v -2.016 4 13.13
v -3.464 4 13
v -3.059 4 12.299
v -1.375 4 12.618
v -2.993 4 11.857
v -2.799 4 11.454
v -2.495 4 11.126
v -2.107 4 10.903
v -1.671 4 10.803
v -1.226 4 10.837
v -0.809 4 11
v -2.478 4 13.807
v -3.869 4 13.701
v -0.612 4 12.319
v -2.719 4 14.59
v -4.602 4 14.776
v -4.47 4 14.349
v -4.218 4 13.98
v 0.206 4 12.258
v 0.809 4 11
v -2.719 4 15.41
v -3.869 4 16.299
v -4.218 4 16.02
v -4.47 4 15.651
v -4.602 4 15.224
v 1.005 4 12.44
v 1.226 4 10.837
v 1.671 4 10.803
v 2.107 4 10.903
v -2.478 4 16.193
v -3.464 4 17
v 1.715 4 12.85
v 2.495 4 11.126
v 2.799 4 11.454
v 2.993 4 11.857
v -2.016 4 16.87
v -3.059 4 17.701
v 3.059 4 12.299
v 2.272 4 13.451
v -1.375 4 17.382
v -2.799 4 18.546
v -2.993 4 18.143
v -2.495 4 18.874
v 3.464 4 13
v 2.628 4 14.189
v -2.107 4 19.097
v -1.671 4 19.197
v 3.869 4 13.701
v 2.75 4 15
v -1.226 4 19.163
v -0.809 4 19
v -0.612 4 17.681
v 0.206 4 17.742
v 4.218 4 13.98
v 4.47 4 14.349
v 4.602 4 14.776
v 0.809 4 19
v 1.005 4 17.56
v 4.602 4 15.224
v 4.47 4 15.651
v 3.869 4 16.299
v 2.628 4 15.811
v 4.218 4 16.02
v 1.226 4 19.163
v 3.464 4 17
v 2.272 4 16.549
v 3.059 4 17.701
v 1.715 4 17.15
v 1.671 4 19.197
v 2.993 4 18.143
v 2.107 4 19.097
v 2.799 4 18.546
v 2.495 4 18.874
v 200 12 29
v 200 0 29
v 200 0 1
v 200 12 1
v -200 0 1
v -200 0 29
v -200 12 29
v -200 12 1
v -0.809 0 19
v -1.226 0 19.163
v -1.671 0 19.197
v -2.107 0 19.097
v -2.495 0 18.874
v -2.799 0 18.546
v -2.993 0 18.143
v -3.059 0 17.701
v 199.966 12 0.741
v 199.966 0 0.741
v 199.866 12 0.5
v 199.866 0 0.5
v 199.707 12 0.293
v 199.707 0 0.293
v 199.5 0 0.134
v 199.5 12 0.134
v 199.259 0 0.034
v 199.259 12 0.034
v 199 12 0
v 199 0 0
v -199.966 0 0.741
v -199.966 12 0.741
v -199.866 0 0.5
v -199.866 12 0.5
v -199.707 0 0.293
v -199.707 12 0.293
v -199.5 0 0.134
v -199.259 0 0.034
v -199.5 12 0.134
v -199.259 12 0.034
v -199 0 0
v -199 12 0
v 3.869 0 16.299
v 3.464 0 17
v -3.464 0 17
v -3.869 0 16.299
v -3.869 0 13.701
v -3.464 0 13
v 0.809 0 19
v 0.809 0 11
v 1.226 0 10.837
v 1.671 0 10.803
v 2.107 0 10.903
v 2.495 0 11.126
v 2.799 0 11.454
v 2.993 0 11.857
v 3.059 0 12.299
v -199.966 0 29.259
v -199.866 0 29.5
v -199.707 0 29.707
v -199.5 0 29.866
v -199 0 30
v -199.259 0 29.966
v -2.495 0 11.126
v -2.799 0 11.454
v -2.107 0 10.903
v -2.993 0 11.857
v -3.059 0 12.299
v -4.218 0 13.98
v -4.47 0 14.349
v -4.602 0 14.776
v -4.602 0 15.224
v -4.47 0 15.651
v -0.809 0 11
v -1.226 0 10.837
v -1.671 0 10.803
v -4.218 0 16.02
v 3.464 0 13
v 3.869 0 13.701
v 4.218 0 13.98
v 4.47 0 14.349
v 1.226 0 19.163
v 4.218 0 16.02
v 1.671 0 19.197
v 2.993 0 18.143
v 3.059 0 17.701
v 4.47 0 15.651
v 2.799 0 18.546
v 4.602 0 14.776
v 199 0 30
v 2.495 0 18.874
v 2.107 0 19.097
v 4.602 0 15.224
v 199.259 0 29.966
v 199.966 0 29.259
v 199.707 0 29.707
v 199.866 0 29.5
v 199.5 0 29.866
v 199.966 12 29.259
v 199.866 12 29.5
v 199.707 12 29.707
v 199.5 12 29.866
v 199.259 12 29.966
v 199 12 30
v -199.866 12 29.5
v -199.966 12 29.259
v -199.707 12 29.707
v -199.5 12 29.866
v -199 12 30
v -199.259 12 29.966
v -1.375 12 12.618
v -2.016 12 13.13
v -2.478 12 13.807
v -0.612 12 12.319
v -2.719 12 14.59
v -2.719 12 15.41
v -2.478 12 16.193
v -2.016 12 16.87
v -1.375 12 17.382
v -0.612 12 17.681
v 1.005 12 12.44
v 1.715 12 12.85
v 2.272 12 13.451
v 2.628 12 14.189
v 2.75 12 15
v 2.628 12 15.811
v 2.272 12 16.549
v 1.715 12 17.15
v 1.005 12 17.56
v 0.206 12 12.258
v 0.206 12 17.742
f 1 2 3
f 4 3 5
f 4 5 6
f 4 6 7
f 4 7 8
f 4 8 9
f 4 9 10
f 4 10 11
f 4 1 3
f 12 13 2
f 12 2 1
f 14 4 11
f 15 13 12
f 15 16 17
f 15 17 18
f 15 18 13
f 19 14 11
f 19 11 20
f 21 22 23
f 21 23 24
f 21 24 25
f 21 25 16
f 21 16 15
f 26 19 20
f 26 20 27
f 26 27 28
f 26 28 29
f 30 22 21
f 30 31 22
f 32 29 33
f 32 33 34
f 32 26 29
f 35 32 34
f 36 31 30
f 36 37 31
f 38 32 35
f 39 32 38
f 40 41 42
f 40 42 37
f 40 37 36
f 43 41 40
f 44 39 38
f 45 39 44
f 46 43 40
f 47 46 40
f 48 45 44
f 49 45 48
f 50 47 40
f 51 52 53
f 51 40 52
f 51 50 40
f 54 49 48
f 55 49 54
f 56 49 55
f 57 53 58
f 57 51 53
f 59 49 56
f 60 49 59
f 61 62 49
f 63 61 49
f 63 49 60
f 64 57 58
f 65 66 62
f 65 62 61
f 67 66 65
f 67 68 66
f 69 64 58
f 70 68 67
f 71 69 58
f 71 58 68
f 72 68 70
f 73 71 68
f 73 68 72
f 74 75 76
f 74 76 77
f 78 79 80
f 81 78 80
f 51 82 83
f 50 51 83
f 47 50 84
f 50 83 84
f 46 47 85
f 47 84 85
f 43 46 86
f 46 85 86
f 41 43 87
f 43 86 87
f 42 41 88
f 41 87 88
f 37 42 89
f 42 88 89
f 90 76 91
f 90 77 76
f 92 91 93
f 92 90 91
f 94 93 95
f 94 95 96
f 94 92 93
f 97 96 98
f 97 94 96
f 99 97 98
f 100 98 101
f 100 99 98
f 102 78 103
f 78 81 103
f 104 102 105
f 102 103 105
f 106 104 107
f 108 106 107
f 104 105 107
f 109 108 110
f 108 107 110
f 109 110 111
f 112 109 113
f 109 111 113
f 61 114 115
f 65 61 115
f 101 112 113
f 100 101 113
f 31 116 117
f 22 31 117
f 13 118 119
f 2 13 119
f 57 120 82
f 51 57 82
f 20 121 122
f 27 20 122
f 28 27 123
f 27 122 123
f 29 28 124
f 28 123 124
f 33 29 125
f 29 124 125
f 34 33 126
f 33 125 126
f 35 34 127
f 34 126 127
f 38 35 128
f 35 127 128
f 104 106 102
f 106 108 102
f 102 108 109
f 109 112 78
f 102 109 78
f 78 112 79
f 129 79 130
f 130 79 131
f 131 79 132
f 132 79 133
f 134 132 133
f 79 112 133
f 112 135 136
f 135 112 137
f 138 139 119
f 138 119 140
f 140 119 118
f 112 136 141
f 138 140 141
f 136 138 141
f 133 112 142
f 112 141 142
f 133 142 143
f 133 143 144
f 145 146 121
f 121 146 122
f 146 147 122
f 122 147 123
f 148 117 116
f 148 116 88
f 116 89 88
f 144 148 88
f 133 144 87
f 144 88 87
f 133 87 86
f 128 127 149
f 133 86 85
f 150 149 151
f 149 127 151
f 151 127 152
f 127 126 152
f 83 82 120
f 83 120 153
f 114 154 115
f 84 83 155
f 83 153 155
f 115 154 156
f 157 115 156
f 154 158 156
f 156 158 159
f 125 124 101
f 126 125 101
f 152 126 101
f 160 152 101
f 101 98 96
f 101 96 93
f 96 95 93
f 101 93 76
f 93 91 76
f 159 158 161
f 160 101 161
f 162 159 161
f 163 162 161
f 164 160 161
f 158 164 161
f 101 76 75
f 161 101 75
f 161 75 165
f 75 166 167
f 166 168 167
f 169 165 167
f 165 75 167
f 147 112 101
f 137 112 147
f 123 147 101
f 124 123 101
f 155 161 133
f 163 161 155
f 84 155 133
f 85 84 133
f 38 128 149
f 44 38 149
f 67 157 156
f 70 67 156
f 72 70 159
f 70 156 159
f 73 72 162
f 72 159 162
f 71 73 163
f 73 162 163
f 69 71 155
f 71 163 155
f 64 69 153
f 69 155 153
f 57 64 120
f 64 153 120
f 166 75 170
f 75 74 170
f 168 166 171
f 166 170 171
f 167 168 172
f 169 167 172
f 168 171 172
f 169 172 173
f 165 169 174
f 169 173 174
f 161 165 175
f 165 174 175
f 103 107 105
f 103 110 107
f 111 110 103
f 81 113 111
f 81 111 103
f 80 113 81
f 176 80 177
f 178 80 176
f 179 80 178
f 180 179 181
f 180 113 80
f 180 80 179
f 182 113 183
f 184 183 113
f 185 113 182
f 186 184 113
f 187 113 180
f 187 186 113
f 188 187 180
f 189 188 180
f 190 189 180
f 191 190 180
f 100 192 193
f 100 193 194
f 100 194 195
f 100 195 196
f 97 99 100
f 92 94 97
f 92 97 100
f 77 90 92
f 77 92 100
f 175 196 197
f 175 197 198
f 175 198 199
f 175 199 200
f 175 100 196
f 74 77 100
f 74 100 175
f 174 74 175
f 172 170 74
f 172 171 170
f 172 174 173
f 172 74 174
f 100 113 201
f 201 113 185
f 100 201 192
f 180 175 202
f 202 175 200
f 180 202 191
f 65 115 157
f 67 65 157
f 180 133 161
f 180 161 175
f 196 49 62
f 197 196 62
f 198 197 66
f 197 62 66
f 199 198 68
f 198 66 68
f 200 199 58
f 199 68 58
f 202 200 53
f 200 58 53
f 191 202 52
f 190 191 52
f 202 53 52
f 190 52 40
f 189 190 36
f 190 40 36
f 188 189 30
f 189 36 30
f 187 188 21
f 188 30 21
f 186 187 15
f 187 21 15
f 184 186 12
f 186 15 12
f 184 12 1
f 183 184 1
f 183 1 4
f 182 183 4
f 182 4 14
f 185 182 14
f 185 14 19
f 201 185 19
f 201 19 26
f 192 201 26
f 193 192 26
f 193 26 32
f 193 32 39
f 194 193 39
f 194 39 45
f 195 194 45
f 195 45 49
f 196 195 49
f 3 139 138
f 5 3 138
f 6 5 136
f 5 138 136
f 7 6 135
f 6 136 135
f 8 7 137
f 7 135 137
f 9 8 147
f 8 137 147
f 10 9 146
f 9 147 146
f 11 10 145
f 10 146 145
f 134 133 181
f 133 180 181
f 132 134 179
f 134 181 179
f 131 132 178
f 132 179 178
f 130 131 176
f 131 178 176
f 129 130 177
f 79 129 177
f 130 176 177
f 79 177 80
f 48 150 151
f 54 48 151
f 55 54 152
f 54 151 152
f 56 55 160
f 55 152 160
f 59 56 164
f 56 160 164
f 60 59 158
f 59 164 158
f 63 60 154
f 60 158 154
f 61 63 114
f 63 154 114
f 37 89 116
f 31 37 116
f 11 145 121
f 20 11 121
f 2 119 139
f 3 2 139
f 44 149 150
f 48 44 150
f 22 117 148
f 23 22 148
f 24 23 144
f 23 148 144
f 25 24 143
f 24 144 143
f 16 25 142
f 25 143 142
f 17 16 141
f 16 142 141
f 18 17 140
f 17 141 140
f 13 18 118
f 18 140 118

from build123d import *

# Parameters (mm, degrees)
F0_W     = 12
F0_H     = 30
F1_DEPTH = 200
F2_R     = 1
F3_R     = 2.75
F4_DEPTH = 4
F5_DEPTH = 12.001


with BuildPart() as f1:
    # F0 (on Right) → F1 (new body, symmetric)
    with BuildSketch(Plane.YZ):
        with Locations((6, 15)):
            Rectangle(F0_W, F0_H)
    extrude(amount=F1_DEPTH, both=True)

    # F2
    f2_edges = [f1.edges().sort_by_distance(p)[0] for p in [
        (-200, 6, 30),
        (200, 6, 30),
        (200, 6, 0),
        (-200, 6, 0),
    ]]
    fillet(f2_edges, radius=F2_R)

    # F3 (on face) → F4 (cut)
    with BuildSketch(Plane.XZ):
        with BuildLine():
            Line((3.4641016151, 17), (3.0594010768, 17.7009618943))
            ThreePointArc((3.0594010768, 17.7009618943), (2.3094010768, 19), (0.8094010768, 19))
            Line((0.8094010768, 19), (0, 19))
            Line((0, 19), (-0.8094010768, 19))
            ThreePointArc((-0.8094010768, 19), (-2.3094010768, 19), (-3.0594010768, 17.7009618943))
            Line((-3.0594010768, 17.7009618943), (-3.4641016151, 17))
            Line((-3.4641016151, 17), (-3.8688021535, 16.2990381057))
            ThreePointArc((-3.8688021535, 16.2990381057), (-4.6188021535, 15), (-3.8688021535, 13.7009618943))
            Line((-3.8688021535, 13.7009618943), (-3.4641016151, 13))
            Line((-3.4641016151, 13), (-3.0594010768, 12.2990381057))
            ThreePointArc((-3.0594010768, 12.2990381057), (-2.3094010768, 11), (-0.8094010768, 11))
            Line((-0.8094010768, 11), (0, 11))
            Line((0, 11), (0.8094010768, 11))
            ThreePointArc((0.8094010768, 11), (2.3094010768, 11), (3.0594010768, 12.2990381057))
            Line((3.0594010768, 12.2990381057), (3.4641016151, 13))
            Line((3.4641016151, 13), (3.8688021535, 13.7009618943))
            ThreePointArc((3.8688021535, 13.7009618943), (4.6188021535, 15), (3.8688021535, 16.2990381057))
            Line((3.8688021535, 16.2990381057), (3.4641016151, 17))
        make_face()
        with Locations((0, 15)):
            Circle(F3_R, mode=Mode.SUBTRACT)
    extrude(amount=-F4_DEPTH, mode=Mode.SUBTRACT)

    # F5 (cut, through all): a face of the model
    f5_faces = [f1.faces().sort_by_distance(p)[0] for p in [
        (0, 0, 15),
    ]]
    extrude(f5_faces, amount=-F5_DEPTH, mode=Mode.SUBTRACT)


solid = f1.part
